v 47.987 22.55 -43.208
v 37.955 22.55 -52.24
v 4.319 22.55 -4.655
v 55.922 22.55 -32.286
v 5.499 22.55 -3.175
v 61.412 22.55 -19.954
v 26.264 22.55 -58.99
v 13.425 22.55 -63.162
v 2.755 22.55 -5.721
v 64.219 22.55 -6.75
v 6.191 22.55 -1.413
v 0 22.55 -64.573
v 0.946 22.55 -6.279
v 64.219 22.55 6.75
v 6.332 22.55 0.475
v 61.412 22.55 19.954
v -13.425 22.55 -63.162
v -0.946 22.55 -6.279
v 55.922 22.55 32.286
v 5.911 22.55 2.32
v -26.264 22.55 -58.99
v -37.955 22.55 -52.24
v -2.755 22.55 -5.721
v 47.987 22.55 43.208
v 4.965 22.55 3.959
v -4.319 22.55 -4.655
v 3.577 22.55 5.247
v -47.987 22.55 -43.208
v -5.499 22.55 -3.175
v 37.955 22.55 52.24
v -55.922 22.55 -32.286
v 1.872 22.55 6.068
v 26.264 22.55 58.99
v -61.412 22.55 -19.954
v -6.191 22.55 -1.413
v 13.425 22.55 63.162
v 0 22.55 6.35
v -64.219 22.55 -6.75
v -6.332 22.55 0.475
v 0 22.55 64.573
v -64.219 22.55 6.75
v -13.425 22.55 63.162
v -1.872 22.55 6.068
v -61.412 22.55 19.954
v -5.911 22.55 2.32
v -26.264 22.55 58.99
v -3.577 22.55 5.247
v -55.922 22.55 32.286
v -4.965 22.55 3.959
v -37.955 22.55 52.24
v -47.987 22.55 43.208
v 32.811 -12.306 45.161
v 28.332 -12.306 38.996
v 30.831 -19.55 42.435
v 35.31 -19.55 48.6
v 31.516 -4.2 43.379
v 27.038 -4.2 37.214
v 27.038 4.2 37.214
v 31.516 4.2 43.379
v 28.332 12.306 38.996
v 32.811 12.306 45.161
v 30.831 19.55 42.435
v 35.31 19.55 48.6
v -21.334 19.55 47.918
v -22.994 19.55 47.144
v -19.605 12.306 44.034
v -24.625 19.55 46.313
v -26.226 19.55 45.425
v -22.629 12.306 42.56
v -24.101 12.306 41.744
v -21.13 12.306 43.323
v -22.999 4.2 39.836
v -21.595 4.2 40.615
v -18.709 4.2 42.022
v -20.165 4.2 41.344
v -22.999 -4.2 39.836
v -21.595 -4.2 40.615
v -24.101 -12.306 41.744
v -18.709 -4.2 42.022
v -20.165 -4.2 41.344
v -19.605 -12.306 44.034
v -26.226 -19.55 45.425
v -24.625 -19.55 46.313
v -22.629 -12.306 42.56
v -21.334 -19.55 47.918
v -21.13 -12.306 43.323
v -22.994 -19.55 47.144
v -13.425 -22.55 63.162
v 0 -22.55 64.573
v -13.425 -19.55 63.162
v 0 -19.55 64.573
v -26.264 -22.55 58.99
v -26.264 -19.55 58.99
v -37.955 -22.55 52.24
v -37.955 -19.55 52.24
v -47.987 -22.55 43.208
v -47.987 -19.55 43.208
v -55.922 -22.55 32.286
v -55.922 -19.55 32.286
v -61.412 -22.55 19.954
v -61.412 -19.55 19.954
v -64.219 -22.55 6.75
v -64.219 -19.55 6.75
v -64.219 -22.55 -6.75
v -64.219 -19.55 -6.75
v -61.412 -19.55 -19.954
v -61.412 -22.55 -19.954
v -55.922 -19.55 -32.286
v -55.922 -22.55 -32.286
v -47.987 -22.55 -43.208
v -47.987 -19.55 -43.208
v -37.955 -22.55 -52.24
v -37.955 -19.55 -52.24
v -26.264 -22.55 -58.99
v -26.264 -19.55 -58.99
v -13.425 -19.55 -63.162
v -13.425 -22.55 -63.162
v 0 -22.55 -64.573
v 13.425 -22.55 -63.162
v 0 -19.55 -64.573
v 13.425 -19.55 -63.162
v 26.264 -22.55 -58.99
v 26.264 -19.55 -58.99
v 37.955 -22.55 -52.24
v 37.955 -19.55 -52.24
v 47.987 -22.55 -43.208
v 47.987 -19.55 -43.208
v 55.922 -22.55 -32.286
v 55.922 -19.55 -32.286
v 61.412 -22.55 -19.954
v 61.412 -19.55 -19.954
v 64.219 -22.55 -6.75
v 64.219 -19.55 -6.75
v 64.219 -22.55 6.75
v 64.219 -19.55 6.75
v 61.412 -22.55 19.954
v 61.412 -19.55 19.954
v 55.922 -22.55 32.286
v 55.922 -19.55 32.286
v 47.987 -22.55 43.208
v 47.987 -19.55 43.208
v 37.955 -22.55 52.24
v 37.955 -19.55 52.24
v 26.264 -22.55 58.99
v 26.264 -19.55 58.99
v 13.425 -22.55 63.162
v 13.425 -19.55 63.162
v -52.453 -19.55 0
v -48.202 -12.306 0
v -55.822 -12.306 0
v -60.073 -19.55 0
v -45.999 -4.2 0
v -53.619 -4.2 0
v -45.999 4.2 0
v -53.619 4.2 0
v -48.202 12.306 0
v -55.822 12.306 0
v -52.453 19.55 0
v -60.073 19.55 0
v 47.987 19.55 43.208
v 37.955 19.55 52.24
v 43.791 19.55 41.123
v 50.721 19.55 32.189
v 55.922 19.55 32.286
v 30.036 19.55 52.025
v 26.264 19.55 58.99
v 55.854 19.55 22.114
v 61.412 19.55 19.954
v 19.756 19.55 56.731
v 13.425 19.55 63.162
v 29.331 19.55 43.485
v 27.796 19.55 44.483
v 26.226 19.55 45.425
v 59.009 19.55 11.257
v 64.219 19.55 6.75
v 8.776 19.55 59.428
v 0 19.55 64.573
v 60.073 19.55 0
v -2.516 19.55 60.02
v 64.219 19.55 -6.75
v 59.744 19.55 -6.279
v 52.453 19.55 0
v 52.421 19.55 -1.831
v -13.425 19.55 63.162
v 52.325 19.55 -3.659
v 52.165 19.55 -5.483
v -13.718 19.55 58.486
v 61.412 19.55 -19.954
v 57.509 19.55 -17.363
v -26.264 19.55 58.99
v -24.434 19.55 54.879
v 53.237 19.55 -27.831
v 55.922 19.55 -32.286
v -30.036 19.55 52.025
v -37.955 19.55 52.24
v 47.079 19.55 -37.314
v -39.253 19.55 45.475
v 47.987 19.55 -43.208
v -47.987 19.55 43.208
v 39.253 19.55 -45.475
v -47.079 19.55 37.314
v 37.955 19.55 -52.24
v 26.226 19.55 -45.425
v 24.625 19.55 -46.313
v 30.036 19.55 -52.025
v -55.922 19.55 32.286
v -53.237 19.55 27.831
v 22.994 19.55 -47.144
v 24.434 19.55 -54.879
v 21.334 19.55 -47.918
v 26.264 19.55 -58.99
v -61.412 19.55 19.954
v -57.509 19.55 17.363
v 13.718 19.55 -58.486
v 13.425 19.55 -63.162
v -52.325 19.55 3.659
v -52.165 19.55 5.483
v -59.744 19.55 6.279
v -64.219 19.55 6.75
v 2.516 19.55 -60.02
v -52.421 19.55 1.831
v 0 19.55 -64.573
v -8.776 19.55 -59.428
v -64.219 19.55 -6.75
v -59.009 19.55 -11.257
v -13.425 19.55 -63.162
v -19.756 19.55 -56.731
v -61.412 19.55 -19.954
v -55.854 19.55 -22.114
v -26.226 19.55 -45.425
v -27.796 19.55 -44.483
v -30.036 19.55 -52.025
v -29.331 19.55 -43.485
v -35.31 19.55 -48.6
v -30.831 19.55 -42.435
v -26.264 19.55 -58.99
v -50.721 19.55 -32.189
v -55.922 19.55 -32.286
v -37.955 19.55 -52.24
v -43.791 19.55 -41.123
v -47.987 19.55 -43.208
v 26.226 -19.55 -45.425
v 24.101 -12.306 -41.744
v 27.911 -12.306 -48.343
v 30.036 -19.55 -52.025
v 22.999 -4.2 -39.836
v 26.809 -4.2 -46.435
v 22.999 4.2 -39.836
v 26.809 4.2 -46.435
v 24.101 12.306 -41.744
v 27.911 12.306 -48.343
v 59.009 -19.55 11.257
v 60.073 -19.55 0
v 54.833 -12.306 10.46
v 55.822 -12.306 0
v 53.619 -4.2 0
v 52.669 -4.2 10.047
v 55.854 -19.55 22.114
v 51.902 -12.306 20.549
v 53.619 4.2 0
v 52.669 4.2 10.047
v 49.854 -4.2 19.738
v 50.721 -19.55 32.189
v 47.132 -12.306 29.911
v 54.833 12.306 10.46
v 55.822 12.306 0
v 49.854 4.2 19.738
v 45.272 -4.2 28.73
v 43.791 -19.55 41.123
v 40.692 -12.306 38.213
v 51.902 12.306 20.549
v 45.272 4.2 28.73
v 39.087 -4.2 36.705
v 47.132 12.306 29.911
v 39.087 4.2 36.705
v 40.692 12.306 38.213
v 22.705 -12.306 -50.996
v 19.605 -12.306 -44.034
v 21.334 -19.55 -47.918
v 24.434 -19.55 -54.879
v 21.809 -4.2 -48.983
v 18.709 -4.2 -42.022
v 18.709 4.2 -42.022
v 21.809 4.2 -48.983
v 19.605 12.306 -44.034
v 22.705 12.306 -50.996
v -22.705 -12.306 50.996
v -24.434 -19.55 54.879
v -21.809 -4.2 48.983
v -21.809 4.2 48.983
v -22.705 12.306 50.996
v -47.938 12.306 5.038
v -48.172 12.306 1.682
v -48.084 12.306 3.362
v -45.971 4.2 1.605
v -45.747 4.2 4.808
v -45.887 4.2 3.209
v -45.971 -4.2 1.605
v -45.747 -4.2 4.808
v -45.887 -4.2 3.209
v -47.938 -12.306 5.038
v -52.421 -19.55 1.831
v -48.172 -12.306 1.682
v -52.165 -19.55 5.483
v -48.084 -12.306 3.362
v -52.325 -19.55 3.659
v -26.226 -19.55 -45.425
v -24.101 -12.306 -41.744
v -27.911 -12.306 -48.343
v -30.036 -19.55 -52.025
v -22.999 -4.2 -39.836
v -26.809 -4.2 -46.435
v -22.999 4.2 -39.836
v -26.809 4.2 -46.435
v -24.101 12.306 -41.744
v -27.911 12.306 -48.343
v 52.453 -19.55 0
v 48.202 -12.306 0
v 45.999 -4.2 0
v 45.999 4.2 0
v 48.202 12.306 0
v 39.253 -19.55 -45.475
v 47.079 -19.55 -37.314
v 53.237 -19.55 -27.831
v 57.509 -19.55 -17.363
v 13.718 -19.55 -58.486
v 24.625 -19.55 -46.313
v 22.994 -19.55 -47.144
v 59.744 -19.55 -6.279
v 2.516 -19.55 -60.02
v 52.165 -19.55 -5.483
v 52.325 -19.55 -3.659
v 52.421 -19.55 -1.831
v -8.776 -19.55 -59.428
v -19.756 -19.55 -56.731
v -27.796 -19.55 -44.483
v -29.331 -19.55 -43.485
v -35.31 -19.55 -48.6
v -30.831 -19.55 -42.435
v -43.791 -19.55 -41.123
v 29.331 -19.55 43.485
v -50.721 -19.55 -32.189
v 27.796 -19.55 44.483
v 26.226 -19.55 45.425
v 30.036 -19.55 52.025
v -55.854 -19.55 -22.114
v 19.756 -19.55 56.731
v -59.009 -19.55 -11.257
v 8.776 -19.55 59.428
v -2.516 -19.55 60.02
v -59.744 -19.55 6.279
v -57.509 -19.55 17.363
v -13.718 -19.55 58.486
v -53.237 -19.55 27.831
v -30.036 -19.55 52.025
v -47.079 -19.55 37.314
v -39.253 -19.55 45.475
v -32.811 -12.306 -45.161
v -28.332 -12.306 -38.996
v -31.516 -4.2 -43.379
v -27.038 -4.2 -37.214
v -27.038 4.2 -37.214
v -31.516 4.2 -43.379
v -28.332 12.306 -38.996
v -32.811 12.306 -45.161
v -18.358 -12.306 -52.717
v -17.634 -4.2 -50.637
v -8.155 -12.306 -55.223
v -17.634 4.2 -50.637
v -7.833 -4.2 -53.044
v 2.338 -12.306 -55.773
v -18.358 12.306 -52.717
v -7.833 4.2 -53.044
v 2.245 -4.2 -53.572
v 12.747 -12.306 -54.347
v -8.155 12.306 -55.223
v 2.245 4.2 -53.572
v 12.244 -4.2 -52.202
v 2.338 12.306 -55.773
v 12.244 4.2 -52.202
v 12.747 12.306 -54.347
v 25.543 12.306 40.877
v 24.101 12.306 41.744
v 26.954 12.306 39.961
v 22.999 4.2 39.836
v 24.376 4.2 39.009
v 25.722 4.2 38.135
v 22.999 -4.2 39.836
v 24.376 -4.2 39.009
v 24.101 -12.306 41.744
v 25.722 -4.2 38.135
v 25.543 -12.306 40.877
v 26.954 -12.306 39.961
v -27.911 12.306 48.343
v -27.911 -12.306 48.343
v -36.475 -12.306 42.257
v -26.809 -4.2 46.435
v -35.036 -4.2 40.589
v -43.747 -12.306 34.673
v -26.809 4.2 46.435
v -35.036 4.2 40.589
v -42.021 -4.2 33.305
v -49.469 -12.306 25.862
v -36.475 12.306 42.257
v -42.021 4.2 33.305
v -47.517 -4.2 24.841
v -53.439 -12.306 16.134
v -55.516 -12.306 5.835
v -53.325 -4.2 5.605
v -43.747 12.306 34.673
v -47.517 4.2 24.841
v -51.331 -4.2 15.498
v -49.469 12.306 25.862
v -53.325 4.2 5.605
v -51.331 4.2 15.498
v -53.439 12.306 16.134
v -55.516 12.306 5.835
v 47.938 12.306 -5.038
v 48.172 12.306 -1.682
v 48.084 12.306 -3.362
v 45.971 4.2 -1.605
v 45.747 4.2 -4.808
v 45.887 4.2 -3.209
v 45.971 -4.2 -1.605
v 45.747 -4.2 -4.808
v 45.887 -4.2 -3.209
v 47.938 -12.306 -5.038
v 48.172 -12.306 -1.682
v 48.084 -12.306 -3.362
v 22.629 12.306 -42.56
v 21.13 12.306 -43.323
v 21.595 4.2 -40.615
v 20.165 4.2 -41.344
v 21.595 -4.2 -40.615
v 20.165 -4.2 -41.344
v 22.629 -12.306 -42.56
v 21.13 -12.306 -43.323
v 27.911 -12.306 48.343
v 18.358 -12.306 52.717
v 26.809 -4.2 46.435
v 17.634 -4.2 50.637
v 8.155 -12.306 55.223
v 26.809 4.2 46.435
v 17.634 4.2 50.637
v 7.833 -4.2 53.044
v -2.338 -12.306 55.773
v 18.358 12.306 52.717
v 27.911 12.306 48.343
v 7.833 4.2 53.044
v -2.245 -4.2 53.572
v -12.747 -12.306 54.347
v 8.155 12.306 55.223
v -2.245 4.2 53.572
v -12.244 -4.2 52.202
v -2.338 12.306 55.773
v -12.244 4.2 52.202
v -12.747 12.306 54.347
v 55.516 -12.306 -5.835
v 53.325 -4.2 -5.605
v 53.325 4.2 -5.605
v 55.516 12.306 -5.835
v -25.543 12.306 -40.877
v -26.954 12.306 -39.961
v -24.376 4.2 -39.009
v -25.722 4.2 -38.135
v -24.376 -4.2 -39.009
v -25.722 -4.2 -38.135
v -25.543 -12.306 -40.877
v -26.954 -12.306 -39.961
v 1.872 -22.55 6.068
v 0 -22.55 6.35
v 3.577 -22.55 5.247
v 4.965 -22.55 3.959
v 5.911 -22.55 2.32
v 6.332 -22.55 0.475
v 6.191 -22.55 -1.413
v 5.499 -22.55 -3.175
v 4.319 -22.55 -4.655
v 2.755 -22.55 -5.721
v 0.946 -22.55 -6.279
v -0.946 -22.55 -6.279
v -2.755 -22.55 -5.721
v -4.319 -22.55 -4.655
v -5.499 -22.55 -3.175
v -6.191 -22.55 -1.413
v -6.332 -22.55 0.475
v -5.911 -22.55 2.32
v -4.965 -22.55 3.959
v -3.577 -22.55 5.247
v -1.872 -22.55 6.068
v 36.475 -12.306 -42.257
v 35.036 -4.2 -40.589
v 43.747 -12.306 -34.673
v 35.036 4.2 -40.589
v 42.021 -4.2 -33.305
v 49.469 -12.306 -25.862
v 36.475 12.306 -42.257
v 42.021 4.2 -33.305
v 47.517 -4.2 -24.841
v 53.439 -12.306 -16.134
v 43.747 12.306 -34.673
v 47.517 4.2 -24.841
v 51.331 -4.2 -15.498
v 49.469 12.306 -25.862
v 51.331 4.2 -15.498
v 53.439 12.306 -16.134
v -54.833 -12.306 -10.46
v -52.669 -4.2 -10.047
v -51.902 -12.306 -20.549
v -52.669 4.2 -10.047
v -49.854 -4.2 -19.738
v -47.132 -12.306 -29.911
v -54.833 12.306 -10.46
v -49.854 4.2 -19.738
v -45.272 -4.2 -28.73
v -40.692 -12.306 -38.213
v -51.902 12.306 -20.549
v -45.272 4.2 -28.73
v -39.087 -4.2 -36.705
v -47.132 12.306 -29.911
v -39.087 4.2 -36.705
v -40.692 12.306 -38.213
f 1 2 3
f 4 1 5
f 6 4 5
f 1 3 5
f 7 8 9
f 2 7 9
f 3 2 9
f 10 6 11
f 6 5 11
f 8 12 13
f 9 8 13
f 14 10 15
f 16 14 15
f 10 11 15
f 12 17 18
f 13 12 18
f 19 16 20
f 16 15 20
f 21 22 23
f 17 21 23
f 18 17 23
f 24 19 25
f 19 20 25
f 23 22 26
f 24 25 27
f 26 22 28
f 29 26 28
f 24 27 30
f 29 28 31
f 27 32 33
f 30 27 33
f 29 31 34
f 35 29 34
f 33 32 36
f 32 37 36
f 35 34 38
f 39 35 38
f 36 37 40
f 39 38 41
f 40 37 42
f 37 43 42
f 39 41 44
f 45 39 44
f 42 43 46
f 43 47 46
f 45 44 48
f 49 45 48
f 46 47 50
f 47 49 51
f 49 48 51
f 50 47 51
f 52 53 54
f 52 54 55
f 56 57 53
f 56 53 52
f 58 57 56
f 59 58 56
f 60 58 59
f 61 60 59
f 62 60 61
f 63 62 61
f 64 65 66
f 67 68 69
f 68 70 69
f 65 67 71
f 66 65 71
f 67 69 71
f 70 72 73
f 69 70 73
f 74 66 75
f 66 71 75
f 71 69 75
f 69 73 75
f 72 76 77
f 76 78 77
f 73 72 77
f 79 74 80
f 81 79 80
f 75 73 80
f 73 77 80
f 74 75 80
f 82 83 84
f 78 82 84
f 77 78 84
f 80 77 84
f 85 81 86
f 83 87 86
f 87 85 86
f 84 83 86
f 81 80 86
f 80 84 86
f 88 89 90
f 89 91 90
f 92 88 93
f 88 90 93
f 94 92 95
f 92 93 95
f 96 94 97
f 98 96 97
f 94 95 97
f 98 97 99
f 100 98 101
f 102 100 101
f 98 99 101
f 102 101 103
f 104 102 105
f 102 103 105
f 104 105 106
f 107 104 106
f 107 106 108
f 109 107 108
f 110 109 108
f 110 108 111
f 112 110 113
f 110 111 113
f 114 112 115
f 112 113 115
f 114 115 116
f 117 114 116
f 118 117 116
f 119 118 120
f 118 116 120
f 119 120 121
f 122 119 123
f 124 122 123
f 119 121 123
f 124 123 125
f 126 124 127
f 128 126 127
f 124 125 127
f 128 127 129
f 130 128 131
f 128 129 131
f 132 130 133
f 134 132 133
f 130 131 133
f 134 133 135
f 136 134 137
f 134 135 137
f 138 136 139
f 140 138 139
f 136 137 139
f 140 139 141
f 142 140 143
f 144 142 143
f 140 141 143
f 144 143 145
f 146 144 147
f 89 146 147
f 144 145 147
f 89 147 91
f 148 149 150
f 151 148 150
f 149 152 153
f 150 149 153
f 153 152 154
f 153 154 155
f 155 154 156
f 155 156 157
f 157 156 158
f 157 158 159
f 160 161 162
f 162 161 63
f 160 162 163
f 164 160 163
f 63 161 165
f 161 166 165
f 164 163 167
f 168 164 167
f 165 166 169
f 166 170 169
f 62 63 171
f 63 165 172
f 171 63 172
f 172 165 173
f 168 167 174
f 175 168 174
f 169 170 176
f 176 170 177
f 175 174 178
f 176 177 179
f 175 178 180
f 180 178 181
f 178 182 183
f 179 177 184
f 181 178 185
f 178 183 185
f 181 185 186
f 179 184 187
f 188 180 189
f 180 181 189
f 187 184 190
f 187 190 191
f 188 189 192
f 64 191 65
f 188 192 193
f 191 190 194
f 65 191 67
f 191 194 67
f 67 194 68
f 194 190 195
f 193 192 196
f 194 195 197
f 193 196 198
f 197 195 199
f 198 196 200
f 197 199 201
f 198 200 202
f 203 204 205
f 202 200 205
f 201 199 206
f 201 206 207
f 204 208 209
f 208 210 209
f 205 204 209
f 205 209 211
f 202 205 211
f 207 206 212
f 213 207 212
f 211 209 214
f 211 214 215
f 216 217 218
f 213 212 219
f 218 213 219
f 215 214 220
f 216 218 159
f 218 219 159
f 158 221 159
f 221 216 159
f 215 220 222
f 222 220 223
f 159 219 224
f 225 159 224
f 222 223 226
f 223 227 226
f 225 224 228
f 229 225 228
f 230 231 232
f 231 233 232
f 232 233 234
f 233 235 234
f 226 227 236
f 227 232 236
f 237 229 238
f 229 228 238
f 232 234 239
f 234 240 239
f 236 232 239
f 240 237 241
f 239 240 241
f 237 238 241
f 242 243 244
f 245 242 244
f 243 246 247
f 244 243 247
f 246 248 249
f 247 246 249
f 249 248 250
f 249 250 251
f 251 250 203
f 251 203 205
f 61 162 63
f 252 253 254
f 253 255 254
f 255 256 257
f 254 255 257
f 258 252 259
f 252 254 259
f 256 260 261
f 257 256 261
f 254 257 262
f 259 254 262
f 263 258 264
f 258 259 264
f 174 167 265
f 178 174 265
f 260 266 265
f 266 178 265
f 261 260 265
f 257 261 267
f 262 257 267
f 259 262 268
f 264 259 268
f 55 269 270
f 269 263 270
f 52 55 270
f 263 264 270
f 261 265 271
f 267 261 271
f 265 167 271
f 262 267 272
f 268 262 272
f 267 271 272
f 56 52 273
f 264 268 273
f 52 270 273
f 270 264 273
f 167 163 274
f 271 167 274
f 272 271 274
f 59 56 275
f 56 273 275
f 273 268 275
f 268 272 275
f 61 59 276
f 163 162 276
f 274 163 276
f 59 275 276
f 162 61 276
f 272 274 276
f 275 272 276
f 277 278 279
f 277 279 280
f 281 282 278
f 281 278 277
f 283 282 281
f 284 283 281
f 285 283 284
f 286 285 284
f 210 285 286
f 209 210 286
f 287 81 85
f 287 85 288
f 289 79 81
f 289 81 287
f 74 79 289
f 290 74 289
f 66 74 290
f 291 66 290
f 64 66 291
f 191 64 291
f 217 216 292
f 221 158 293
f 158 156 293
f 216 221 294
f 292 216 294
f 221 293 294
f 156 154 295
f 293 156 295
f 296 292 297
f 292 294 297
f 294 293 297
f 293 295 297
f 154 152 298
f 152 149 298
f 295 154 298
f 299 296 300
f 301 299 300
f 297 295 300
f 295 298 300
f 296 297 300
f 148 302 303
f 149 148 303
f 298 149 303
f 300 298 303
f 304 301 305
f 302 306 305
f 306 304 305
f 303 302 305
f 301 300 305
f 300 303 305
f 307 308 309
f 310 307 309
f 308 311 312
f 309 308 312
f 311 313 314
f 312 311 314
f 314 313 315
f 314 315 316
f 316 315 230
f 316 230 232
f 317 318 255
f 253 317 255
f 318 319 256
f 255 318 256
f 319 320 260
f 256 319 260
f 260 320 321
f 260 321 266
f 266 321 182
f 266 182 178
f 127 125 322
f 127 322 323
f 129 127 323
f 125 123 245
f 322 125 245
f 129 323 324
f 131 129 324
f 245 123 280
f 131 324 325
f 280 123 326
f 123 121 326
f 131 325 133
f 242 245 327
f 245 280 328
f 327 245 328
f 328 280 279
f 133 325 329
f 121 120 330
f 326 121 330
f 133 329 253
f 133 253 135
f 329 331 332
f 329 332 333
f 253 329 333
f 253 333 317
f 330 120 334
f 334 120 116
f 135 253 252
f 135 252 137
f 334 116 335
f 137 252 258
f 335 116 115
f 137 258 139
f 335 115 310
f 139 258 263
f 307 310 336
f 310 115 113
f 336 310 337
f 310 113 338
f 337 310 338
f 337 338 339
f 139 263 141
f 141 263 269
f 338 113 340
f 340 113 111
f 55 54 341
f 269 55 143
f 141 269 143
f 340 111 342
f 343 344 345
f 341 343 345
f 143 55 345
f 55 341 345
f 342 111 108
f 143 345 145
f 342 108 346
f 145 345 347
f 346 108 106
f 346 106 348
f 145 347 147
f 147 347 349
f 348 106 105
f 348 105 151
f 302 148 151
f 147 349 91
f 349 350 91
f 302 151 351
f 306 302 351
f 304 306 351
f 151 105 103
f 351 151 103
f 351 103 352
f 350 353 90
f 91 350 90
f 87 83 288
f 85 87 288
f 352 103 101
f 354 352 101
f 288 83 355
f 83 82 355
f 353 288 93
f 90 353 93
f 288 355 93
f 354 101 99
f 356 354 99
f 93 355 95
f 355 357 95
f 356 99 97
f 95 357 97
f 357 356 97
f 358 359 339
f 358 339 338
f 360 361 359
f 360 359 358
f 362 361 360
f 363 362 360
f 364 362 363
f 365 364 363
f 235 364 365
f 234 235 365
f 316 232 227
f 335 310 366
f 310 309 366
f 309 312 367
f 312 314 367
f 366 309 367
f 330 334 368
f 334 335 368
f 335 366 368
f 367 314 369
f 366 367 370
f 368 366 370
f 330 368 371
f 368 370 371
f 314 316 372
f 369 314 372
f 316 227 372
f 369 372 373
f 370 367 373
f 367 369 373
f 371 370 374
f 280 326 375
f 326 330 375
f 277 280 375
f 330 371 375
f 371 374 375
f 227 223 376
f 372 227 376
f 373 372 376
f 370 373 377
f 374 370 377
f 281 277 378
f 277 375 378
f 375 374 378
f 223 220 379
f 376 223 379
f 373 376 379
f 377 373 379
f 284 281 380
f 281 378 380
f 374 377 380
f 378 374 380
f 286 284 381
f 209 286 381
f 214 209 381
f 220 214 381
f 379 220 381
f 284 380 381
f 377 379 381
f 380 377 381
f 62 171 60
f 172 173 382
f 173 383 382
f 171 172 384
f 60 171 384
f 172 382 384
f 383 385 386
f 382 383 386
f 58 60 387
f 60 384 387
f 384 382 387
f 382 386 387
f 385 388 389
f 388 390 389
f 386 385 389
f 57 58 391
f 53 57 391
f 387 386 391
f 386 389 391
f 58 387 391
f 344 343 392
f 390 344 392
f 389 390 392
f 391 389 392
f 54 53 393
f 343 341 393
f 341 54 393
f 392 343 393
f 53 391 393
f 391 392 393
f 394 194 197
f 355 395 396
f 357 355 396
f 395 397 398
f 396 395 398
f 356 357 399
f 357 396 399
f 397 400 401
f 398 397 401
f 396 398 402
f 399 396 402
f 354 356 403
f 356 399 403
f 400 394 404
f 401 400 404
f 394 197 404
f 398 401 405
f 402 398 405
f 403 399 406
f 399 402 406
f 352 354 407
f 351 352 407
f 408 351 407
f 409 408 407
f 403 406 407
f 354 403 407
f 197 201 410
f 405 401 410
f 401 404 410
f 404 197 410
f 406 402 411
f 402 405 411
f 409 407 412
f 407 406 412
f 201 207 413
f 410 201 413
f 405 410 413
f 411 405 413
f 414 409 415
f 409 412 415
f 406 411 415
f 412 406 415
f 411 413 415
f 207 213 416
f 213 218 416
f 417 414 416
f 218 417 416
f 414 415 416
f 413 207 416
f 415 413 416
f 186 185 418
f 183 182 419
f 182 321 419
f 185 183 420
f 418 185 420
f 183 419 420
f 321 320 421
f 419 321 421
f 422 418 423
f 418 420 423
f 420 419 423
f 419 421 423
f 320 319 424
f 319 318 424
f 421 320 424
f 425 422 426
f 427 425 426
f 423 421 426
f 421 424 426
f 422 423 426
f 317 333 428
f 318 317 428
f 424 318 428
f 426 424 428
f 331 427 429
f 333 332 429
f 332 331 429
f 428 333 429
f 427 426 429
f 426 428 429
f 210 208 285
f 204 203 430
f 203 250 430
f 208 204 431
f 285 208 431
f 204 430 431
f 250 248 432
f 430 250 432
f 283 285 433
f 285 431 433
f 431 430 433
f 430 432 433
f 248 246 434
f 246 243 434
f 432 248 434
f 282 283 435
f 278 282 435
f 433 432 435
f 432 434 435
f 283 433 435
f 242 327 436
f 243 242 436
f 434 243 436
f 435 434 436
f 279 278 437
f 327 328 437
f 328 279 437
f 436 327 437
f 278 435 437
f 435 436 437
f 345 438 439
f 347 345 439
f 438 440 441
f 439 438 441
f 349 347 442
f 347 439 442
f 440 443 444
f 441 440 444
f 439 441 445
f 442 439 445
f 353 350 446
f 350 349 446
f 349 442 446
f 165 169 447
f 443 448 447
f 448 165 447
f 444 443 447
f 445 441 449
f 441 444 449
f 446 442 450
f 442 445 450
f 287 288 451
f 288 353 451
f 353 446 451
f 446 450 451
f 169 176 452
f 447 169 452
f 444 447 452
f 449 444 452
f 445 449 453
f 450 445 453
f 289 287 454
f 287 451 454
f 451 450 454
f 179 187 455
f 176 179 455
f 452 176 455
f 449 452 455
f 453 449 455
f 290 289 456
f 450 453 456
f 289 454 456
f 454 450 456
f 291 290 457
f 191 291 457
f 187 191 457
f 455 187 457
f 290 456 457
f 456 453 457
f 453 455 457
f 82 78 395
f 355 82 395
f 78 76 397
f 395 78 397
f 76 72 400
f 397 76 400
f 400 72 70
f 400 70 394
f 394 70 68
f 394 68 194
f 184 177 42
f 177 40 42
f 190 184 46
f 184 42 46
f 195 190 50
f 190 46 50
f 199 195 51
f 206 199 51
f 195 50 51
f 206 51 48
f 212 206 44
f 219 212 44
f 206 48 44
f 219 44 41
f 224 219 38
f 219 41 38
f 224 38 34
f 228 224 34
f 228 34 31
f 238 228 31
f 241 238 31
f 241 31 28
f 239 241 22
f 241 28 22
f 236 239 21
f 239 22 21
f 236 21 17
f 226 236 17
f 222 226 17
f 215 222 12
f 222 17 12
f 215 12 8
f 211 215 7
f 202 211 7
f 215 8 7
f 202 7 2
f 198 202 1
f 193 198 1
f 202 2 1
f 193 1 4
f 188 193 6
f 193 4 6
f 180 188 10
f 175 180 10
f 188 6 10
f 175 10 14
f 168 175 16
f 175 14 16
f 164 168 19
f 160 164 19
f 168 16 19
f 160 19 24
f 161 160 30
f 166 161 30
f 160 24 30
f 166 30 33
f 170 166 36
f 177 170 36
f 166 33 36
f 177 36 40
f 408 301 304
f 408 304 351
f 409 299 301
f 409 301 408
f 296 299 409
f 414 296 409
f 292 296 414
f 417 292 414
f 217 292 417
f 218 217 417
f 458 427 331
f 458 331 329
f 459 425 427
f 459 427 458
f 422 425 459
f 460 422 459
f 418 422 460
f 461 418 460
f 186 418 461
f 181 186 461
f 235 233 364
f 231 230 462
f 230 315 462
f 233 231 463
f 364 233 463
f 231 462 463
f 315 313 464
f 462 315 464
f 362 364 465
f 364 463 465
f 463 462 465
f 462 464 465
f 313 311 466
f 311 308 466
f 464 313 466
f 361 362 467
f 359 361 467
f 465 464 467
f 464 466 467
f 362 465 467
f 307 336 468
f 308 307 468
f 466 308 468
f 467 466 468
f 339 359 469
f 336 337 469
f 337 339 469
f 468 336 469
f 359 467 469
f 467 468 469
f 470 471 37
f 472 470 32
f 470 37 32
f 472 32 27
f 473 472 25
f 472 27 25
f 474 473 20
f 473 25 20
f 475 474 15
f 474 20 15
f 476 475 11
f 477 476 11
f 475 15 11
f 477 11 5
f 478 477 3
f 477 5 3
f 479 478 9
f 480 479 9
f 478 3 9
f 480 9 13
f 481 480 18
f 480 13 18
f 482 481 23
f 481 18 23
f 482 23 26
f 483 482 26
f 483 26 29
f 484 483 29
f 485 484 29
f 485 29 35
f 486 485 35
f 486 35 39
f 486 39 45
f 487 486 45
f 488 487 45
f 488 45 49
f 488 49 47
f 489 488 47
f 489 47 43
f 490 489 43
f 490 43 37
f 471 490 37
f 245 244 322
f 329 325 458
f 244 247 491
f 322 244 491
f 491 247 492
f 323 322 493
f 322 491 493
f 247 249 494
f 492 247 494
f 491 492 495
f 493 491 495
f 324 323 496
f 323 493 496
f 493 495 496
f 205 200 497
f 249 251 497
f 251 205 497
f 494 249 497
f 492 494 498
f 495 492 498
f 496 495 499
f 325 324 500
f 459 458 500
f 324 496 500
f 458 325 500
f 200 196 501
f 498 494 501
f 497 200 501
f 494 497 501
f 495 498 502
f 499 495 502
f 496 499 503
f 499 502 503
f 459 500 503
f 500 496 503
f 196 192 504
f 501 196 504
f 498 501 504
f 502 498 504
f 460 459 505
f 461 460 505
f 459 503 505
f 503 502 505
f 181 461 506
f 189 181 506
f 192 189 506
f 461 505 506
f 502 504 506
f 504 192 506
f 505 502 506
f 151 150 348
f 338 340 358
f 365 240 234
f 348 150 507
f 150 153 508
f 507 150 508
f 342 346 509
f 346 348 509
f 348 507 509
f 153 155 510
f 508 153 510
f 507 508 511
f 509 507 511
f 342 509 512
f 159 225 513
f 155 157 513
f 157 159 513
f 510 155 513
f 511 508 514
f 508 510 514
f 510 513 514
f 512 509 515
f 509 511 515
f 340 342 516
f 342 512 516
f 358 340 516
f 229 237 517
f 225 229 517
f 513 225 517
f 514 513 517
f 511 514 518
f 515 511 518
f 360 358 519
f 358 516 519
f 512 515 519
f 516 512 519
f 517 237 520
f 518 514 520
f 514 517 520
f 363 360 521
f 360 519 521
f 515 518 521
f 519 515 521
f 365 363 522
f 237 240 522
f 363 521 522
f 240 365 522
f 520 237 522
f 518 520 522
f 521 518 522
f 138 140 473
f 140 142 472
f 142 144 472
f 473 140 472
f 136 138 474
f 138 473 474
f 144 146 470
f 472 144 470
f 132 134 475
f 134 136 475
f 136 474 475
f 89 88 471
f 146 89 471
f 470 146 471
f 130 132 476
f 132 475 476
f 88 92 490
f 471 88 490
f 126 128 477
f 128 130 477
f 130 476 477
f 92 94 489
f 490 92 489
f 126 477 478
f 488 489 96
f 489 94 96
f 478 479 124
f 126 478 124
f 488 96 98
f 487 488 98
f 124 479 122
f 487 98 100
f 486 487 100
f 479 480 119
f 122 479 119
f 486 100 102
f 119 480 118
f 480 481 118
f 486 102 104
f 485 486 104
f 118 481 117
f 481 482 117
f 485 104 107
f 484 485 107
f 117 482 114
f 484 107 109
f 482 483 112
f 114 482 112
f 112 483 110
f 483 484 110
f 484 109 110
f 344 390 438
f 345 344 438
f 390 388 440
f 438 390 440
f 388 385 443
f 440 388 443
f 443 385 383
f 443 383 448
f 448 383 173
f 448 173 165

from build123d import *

# Parameters (mm, degrees)
SKETCH3_R          = 6.35
CUT_EXTRUDE1_DEPTH = 102.849420847
CUT_REVOLVE5_ANGLE = 6
CIRPATTERN1_COUNT  = 6


with BuildPart() as part:
    # Sketch1 → Revolve1 (revolve)
    with BuildSketch(Plane(origin=(0, 0, 0), x_dir=(0, 0, -1), z_dir=(1, 0, 0))):
        with BuildLine():
            Line((-60.072805913, 19.55), (-64.572805913, 19.55))
            Line((-64.572805913, 19.55), (-64.572805913, 22.55))
            Line((-64.572805913, 22.55), (0, 22.55))
            Line((0, 22.55), (0, -22.55))
            Line((0, -22.55), (-64.572805913, -22.55))
            Line((-64.572805913, -22.55), (-64.572805913, -19.55))
            Line((-64.572805913, -19.55), (-60.072805913, -19.55))
            ThreePointArc((-60.072805913, -19.55), (-53.34, 0), (-60.072805913, 19.55))
        make_face()
    revolve(axis=Axis((0, 22.55, 0), (0, -1, 0)))

    # Sketch3 → Cut-Extrude1 (cut, through all)
    with BuildSketch(Plane(origin=(0, 22.55, 0), x_dir=(1, 0, 0), z_dir=(0, 1, 0))):
        with Locations(Location((0, 0, 0), (0, 0, 270))):
            Circle(SKETCH3_R)
    extrude(amount=-CUT_EXTRUDE1_DEPTH, mode=Mode.SUBTRACT)

    # Sketch4 → Cut-Revolve5 (revolve, cut)
    with BuildSketch(Plane.XY):
        with BuildLine():
            Line((-60.072805913, 19.55), (-52.452805913, 19.55))
            ThreePointArc((-52.452805913, 19.55), (-45.72, 0), (-52.452805913, -19.55))
            Line((-52.452805913, -19.55), (-60.072805913, -19.55))
            ThreePointArc((-60.072805913, -19.55), (-53.34, 0), (-60.072805913, 19.55))
        make_face()
    cut_revolve5 = revolve(axis=Axis((0, 0, 0), (0, 1, 0)), revolution_arc=CUT_REVOLVE5_ANGLE, mode=Mode.SUBTRACT)

    # CirPattern1: Cut-Revolve5 ×6 about axis
    cirpattern1_axis = Axis((0, 0, 0), (0, 1, 0))
    for i in range(1, CIRPATTERN1_COUNT):
        add(cut_revolve5.rotate(cirpattern1_axis, i * 360 / CIRPATTERN1_COUNT), mode=Mode.SUBTRACT)


solid = part.part
